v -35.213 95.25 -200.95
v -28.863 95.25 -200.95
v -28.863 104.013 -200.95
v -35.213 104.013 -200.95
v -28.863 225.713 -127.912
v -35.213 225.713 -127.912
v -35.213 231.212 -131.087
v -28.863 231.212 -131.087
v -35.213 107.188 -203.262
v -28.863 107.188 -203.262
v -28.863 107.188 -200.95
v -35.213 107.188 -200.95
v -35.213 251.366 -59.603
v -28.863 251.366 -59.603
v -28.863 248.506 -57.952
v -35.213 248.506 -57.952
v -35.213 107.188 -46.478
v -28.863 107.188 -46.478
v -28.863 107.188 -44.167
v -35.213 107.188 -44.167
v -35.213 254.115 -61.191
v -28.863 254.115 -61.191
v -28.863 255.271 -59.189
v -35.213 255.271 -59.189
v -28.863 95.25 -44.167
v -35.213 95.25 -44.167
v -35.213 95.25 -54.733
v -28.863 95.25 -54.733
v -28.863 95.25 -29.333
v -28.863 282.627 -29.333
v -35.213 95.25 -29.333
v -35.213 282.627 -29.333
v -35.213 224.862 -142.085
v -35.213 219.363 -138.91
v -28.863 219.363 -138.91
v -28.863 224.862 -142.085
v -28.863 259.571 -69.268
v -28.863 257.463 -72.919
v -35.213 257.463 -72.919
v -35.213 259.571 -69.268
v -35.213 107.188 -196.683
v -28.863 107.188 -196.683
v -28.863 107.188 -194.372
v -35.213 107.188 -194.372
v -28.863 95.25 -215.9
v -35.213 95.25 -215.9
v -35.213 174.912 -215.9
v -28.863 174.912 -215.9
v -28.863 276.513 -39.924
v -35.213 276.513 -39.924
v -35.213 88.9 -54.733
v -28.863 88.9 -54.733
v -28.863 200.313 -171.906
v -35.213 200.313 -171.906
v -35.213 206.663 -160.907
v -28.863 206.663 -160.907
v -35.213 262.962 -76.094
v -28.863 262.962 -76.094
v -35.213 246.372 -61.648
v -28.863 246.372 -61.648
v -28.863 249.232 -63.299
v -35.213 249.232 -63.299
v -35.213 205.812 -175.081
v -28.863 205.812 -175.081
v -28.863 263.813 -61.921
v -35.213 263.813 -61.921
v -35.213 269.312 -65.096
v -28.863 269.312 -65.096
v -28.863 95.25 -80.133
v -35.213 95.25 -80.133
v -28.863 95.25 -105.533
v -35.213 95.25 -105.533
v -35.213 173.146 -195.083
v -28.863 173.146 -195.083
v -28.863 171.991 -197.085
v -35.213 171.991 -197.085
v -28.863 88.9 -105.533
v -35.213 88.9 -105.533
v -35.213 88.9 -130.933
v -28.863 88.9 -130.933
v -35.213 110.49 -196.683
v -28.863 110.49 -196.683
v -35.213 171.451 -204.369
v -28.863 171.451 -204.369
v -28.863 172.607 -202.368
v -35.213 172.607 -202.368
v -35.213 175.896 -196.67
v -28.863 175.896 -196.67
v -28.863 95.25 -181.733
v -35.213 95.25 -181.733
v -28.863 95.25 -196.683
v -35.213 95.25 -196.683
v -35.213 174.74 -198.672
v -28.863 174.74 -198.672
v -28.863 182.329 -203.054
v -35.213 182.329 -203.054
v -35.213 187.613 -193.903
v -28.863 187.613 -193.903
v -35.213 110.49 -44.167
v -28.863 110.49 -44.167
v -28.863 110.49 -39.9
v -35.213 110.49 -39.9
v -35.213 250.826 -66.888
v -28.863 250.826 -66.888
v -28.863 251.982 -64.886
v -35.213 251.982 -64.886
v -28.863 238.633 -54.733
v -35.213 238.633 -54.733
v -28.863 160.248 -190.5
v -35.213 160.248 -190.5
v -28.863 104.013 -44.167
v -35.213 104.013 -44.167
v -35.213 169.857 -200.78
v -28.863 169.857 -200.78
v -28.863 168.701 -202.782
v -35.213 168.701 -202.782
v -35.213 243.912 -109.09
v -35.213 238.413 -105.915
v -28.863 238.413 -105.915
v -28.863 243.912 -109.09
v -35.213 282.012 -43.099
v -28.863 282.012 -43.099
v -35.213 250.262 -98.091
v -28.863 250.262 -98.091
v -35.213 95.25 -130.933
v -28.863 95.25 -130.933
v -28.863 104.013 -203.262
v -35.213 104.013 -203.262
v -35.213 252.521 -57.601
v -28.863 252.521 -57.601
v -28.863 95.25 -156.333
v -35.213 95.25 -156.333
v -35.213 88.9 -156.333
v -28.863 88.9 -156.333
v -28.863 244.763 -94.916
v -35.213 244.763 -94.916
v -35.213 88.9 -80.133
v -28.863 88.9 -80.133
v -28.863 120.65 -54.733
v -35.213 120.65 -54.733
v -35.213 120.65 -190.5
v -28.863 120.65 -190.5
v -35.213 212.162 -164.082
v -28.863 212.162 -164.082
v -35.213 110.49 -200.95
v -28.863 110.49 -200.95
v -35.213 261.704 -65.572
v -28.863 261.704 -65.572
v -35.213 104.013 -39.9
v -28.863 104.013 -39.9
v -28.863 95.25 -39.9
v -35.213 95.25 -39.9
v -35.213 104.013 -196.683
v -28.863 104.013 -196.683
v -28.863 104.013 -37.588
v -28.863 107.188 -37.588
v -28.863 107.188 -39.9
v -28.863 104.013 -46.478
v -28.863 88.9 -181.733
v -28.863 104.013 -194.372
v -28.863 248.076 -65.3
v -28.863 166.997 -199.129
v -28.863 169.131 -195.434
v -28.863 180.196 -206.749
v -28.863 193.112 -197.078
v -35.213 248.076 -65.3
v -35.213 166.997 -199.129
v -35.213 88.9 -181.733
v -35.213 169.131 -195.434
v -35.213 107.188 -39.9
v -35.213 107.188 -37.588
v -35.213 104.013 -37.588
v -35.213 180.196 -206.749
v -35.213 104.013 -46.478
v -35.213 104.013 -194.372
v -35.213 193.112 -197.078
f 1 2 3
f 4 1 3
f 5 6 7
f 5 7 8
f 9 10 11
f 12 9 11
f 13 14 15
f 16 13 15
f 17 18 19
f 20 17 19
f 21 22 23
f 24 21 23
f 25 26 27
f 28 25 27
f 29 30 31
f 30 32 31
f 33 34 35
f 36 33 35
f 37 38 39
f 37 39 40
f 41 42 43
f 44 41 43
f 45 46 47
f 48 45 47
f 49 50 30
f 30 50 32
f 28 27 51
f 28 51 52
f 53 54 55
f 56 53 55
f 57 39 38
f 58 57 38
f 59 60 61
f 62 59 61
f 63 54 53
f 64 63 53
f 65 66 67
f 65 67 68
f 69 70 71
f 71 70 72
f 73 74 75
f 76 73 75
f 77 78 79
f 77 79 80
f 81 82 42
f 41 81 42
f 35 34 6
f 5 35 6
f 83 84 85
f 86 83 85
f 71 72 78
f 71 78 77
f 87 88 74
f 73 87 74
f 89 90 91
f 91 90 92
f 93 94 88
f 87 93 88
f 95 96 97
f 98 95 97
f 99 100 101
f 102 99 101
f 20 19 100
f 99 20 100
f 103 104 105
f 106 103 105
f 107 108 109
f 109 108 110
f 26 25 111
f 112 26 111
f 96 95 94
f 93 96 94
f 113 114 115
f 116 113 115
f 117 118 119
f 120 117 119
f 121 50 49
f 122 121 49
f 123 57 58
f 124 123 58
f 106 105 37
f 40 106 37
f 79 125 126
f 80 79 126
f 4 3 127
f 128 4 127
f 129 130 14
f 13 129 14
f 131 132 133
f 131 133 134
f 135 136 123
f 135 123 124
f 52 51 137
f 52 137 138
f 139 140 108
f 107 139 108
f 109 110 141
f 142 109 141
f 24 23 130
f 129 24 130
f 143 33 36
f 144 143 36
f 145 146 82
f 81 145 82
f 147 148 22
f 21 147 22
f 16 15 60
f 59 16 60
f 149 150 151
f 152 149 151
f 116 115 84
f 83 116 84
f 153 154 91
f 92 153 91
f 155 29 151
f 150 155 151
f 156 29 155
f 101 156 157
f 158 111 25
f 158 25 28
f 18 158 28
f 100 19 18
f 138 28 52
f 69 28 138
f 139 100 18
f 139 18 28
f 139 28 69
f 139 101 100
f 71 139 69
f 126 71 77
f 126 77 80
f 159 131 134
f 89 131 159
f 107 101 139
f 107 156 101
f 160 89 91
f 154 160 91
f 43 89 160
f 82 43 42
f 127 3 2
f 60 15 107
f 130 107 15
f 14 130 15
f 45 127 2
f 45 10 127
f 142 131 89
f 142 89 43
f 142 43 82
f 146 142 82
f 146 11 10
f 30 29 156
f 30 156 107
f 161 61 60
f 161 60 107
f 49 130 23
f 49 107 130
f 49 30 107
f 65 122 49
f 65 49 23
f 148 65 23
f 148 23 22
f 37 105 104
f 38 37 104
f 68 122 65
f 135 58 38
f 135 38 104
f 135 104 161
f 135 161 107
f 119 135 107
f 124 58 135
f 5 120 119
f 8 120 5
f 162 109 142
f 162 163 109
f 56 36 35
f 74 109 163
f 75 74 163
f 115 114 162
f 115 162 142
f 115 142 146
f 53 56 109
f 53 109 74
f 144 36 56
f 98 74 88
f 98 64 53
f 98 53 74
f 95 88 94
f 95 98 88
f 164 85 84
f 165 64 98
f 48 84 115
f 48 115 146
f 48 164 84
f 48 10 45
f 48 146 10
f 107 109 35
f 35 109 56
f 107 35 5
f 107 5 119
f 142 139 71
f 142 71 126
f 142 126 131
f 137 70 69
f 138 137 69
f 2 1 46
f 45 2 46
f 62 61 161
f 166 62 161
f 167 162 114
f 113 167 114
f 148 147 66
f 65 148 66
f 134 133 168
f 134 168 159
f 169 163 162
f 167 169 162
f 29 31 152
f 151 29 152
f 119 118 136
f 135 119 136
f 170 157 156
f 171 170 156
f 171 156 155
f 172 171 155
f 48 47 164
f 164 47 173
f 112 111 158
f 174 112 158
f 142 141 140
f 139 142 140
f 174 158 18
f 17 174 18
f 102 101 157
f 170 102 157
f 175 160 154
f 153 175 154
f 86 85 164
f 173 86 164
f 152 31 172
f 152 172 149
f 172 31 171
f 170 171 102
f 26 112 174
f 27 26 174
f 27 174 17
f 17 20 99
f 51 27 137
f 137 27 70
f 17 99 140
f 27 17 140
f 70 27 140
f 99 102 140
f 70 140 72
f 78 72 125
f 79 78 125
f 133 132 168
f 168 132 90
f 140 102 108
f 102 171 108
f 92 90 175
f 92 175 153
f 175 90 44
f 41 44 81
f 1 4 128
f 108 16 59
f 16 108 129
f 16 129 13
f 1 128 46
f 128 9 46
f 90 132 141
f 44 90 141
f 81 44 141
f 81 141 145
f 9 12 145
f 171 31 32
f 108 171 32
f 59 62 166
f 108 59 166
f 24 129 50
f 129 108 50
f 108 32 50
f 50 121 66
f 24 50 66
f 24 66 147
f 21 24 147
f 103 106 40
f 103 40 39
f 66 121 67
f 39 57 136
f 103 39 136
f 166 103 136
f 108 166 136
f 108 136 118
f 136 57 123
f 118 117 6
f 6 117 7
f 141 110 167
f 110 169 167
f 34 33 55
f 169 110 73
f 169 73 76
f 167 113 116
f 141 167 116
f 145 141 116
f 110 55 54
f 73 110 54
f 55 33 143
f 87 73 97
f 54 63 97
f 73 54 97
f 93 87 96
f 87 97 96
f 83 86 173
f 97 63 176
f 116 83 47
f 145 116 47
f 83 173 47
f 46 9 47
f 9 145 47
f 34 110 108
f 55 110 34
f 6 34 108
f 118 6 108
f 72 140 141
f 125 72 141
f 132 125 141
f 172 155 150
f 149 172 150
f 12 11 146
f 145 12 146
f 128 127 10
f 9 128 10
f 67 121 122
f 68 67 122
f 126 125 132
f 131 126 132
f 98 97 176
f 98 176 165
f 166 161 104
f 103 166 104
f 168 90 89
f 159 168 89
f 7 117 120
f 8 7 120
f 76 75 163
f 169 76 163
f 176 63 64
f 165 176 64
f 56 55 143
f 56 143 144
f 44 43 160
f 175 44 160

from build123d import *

# Parameters (mm, degrees)
BOSS_EXTRUDE1_DEPTH = 3.175
CUT_EXTRUDE1_DEPTH  = 6.35
SKETCH3_W           = 6.35
SKETCH3_H           = 25.4
BOSS_EXTRUDE2_DEPTH = 6.35
LPATTERN1_COUNT     = 5
LPATTERN1_PITCH     = 38.1
SKETCH4_W           = 6.35
SKETCH4_H           = 25.4
BOSS_EXTRUDE3_DEPTH = 6.35
LPATTERN2_COUNT     = 3
LPATTERN2_PITCH     = 50.8
CUT_EXTRUDE2_DEPTH  = 6.35
CUT_EXTRUDE3_DEPTH  = 6.35


with BuildPart() as part:
    # Sketch1 → Boss-Extrude1 (new, symmetric)
    with BuildSketch(Plane.ZY.offset(32.038437852)):
        Polygon((-215.9, 95.25), (-215.9, 174.9125), (-29.333338138, 282.626812448), (-29.333338138, 95.25), align=None)
    extrude(amount=BOSS_EXTRUDE1_DEPTH, both=True)

    # Sketch2 → Cut-Extrude1 (cut)
    with BuildSketch(Plane.ZY.offset(35.213437852)):
        Polygon((-190.5, 160.247803163), (-190.5, 120.65), (-54.733338138, 120.65), (-54.733338138, 238.632721936), align=None)
    extrude(amount=-CUT_EXTRUDE1_DEPTH, mode=Mode.SUBTRACT)

    # Sketch3 → Boss-Extrude2 (add)
    with BuildSketch(Plane(origin=(0, 224.671817339, -129.71433422), x_dir=(1, 0, 0), z_dir=(0, 0.8660254037844386, -0.5000000000000001))):
        with Locations((-32.038437852, 61.418634677)):
            Rectangle(SKETCH3_W, SKETCH3_H)
    boss_extrude2 = extrude(amount=BOSS_EXTRUDE2_DEPTH)

    # LPattern1: Boss-Extrude2 ×5
    with Locations(*[Vector(1.0927391974657063e-15, 0.5000000000000003, 0.8660254037844386) * (i * LPATTERN1_PITCH) for i in range(1, LPATTERN1_COUNT)]):
        add(boss_extrude2)

    # Sketch4 → Boss-Extrude3 (add)
    with BuildSketch(Plane.XZ.offset(-95.25)):
        with Locations((-32.038437852, -67.433338138)):
            Rectangle(SKETCH4_W, SKETCH4_H)
    boss_extrude3 = extrude(amount=BOSS_EXTRUDE3_DEPTH)

    # LPattern2: Boss-Extrude3 ×3
    with Locations(*[(0, 0, -i * LPATTERN2_PITCH) for i in range(1, LPATTERN2_COUNT)]):
        add(boss_extrude3)

    # Sketch5 → Cut-Extrude2 (cut)
    with BuildSketch(Plane(origin=(-28.863437852, 0, 0), x_dir=(0, 0, -1), z_dir=(1, 0, 0))):
        Polygon((196.683069069, 95.25), (200.950269069, 95.25), (200.950269069, 104.013), (203.261669069, 104.013), (203.261669069, 107.188), (200.950269069, 107.188), (200.950269069, 110.49), (196.683069069, 110.49), (196.683069069, 107.188), (194.371669069, 107.188), (194.371669069, 104.013), (196.683069069, 104.013), align=None)
        Polygon((39.899738138, 95.25), (44.166938138, 95.25), (44.166938138, 104.013), (46.478338138, 104.013), (46.478338138, 107.188), (44.166938138, 107.188), (44.166938138, 110.49), (39.899738138, 110.49), (39.899738138, 107.188), (37.588338138, 107.188), (37.588338138, 104.013), (39.899738138, 104.013), align=None)
    extrude(amount=-CUT_EXTRUDE2_DEPTH, mode=Mode.SUBTRACT)

    # Sketch6 → Cut-Extrude3 (cut)
    with BuildSketch(Plane(origin=(-28.863437852, 0, 0), x_dir=(0, 0, -1), z_dir=(1, 0, 0))):
        Polygon((206.749229173, 180.1957), (203.05372557, 182.3293), (198.67222557, 174.740319387), (196.670494452, 175.896019387), (195.082994452, 173.14638873), (197.08472557, 171.99068873), (195.43372557, 169.131072846), (199.129229173, 166.997472846), (200.780229173, 169.85708873), (202.781960292, 168.70138873), (204.369460292, 171.451019387), (202.367729173, 172.606719387), align=None)
        Polygon((69.267696323, 259.5707), (65.57219272, 261.7043), (61.19069272, 254.115319387), (59.188961601, 255.271019387), (57.601461601, 252.52138873), (59.60319272, 251.36568873), (57.95219272, 248.506072846), (61.647696323, 246.372472846), (63.298696323, 249.23208873), (65.300427441, 248.07638873), (66.887927441, 250.826019387), (64.886196323, 251.981719387), align=None)
    extrude(amount=-CUT_EXTRUDE3_DEPTH, mode=Mode.SUBTRACT)


solid = part.part
